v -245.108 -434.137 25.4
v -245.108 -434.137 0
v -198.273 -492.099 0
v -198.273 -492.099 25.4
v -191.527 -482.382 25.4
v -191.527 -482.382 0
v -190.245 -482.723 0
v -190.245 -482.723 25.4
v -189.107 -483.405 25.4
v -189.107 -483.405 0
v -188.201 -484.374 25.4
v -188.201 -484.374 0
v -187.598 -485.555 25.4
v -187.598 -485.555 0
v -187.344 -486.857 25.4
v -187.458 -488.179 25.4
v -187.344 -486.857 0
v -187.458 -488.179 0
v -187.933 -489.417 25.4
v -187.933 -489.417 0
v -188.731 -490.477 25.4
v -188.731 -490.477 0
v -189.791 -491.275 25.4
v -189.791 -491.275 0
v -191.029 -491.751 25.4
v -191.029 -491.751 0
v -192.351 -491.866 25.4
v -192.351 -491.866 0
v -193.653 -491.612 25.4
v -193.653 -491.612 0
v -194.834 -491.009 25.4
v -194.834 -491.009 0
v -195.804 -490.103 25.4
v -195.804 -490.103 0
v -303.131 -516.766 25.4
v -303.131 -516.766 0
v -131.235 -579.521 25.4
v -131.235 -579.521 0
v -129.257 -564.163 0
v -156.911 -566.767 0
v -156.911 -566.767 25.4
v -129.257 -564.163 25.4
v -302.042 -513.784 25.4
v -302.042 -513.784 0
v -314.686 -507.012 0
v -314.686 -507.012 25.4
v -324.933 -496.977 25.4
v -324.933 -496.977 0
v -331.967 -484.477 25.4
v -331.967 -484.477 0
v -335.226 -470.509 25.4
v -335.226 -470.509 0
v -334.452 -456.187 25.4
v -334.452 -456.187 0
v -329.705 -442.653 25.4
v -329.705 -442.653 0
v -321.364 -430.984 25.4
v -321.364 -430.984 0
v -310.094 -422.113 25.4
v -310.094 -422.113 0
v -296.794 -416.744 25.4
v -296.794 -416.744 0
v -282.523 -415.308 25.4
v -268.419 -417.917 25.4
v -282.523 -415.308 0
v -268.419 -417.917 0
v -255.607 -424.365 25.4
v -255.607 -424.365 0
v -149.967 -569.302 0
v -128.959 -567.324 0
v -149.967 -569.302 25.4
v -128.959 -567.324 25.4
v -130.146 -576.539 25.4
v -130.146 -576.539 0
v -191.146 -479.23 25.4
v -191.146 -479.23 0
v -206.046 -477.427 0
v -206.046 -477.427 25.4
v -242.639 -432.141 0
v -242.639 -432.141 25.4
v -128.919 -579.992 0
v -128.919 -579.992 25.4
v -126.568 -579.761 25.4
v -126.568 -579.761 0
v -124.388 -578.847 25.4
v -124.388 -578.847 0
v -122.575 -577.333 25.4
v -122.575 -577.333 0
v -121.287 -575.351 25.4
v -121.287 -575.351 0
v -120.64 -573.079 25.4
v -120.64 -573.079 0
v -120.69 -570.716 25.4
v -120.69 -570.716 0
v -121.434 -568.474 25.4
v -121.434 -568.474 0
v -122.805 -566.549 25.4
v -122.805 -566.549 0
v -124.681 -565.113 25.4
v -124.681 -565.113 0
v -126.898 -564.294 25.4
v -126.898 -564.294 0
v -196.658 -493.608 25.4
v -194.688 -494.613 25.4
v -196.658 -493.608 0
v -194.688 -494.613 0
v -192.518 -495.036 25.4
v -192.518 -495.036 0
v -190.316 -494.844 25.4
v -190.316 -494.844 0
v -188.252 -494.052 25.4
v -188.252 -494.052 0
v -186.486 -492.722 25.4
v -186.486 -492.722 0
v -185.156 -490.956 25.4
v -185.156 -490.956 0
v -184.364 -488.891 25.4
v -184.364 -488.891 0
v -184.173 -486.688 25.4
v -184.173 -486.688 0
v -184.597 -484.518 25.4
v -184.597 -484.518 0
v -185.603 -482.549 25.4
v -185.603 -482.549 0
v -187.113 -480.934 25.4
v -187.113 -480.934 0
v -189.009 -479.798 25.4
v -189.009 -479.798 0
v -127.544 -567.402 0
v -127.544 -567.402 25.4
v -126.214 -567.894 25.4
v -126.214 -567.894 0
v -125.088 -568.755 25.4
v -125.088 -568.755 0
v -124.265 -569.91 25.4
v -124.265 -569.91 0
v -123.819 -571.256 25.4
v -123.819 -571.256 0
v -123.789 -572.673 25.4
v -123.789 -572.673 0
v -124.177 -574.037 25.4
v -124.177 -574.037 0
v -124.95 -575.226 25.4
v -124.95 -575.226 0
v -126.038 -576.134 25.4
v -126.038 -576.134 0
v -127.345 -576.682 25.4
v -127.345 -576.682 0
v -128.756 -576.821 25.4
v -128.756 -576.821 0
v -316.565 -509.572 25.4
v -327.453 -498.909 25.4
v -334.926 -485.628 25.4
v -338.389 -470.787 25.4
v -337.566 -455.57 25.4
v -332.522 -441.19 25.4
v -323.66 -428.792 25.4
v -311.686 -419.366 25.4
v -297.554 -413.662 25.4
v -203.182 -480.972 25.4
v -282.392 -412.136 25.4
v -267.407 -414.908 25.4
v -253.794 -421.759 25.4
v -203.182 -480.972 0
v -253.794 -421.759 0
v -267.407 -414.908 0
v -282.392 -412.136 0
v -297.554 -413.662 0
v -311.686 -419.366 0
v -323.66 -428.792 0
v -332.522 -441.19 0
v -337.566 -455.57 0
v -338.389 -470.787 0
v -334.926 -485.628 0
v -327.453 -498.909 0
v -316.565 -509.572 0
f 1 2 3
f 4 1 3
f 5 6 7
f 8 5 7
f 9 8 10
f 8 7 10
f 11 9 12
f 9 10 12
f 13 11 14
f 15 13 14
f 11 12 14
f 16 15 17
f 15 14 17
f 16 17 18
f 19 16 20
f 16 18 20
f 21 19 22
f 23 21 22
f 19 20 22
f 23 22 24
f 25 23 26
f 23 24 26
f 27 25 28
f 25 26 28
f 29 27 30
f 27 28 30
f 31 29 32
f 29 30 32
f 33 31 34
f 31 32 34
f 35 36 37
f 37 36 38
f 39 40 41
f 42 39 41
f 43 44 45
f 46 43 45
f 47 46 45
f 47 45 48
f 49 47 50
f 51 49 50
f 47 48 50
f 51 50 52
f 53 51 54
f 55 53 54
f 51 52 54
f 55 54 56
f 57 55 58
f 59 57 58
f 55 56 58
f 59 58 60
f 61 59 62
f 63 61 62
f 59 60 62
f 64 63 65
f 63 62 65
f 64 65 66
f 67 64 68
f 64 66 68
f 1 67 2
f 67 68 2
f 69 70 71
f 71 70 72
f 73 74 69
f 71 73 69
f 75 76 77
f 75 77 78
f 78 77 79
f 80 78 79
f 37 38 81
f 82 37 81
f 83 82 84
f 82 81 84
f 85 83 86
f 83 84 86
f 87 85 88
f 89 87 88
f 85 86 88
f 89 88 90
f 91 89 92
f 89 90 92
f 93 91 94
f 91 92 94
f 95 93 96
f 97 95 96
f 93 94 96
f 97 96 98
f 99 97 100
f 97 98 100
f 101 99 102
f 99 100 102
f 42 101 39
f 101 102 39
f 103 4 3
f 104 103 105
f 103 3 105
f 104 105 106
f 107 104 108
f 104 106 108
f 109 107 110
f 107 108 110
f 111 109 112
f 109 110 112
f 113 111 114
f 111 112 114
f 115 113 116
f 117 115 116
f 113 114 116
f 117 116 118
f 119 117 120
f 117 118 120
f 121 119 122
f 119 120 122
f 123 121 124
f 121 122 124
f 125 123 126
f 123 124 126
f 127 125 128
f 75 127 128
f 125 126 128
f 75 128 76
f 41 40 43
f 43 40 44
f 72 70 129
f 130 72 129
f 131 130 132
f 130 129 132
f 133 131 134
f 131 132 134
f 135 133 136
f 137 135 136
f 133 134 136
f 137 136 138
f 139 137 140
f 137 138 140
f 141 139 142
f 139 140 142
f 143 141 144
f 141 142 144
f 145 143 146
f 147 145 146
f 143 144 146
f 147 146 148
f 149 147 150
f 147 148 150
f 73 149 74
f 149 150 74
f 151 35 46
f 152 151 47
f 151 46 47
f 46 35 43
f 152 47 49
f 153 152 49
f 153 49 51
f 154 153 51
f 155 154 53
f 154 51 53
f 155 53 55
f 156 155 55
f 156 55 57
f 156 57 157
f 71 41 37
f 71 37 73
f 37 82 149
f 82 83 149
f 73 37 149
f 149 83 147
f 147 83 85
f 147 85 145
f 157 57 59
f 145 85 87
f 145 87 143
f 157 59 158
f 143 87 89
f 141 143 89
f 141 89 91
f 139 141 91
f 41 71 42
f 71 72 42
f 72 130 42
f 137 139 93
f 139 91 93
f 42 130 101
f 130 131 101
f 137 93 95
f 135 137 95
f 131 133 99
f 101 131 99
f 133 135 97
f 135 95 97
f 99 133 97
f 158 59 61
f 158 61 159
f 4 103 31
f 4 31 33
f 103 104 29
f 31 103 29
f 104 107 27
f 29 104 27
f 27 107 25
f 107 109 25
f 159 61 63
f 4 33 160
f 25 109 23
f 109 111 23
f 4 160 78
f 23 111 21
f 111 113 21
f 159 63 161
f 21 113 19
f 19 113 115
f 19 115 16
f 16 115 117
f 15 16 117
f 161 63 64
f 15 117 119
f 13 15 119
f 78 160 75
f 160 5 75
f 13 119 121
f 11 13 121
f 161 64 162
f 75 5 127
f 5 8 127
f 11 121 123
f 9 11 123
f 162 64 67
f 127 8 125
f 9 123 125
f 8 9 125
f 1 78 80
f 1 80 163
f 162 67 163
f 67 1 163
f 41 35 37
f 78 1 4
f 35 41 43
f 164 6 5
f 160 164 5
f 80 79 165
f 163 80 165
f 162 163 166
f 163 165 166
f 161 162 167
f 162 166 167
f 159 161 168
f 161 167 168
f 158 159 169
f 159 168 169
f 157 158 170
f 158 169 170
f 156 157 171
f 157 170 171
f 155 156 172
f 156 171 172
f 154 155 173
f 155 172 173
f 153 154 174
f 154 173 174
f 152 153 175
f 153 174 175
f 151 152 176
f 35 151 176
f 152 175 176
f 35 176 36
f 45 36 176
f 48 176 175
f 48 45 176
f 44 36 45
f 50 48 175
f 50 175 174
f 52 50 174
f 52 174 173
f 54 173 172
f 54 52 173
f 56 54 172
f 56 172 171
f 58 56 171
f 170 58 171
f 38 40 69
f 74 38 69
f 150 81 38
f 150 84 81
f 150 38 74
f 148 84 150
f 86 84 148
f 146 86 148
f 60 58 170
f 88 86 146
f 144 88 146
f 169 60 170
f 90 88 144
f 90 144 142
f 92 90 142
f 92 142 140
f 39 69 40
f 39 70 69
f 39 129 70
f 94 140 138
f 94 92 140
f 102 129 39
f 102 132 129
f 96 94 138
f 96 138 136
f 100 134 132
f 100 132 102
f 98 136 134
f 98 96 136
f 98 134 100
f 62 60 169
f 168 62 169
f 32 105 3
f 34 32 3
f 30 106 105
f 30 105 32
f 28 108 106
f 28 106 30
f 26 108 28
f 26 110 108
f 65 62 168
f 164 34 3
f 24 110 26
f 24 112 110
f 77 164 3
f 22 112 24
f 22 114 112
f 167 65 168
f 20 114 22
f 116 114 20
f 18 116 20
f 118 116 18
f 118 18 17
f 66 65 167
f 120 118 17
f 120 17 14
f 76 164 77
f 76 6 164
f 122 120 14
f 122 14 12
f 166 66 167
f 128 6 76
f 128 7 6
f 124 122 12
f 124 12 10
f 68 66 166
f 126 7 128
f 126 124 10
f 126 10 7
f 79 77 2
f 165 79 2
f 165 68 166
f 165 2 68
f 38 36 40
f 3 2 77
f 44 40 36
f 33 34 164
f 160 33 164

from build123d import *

# Parameters (mm, degrees)
EXTRUDE_THIN1_DEPTH = 25.4
BOSS_EXTRUDE1_REACH = 633.439
SKETCH3_W           = 25.4
SKETCH3_H           = 3.175
BOSS_EXTRUDE2_REACH = 587.221
SKETCH4_W           = 25.4
SKETCH4_H           = 3.175


with BuildPart() as part:
    # Sketch2 → Extrude-Thin1 (new body)
    with BuildSketch(Plane.XY):
        with BuildLine():
            ThreePointArc((-128.959094117, -567.323540773), (-123.788950473, -572.673268248), (-130.145681643, -576.538748578))
            Line((-130.145681643, -576.538748578), (-302.042094367, -513.783924281))
            ThreePointArc((-302.042094367, -513.783924281), (-325.948053636, -436.522751042), (-245.108142892, -434.136832006))
            Line((-245.108142892, -434.136832006), (-198.273248153, -492.098506685))
            ThreePointArc((-198.273248153, -492.098506685), (-185.155706812, -490.955524281), (-191.14596289, -479.229777749))
            Line((-191.14596289, -479.229777749), (-191.527323999, -482.381791186))
            ThreePointArc((-191.527323999, -482.381791186), (-187.933170352, -489.417239105), (-195.803695157, -490.103028547))
            Line((-195.803695157, -490.103028547), (-242.638589895, -432.141353869))
            ThreePointArc((-242.638589895, -432.141353869), (-328.530995061, -434.676392845), (-303.130913338, -516.76638941))
            Line((-303.130913338, -516.76638941), (-131.234500614, -579.521213708))
            ThreePointArc((-131.234500614, -579.521213708), (-120.639948663, -573.078746491), (-129.256854737, -564.162534033))
            Line((-129.256854737, -564.162534033), (-128.959094117, -567.323540773))
        make_face()
    extrude(amount=EXTRUDE_THIN1_DEPTH)

    # Boss-Extrude1: up to this plane
    boss_extrude1_end = Plane(origin=(-242.638589895, -432.141353869, 25.4), z_dir=(-0.7778119673882409, -0.6284970512163396, 0))
    # Sketch3 → Boss-Extrude1 (add, up to the surface)
    with BuildSketch(Plane(origin=(-131.24290391, 15.879037441, 0), x_dir=(0, 0, 1), z_dir=(-0.9927601375164752, 0.12011373509415744, 0)), mode=Mode.PRIVATE) as boss_extrude1_sk1:
        with Locations((12.7, -500.306975611)):
            Rectangle(SKETCH3_W, SKETCH3_H)
    boss_extrude1_tool1 = split(extrude(boss_extrude1_sk1.sketch, amount=BOSS_EXTRUDE1_REACH, mode=Mode.PRIVATE), bisect_by=boss_extrude1_end, keep=Keep.BOTH, mode=Mode.PRIVATE)
    add(boss_extrude1_tool1.solids().sort_by_distance((-191.336643, -480.805784, 12.7))[0])

    # Boss-Extrude2: up to this plane
    boss_extrude2_end = Plane(origin=(-302.042094367, -513.783924281, 25.4), z_dir=(0.3429351088975487, 0.9393590959188219, 0))
    # Sketch4 → Boss-Extrude2 (add, up to the surface)
    with BuildSketch(Plane(origin=(-180.795608077, -17.030590821, 0), x_dir=(0, 0, 1), z_dir=(-0.9955926741540518, -0.09378287248098222, 0)), mode=Mode.PRIVATE) as boss_extrude2_sk1:
        with Locations((12.7, -551.14150679)):
            Rectangle(SKETCH4_W, SKETCH4_H)
    boss_extrude2_tool1 = split(extrude(boss_extrude2_sk1.sketch, amount=BOSS_EXTRUDE2_REACH, mode=Mode.PRIVATE), bisect_by=boss_extrude2_end, keep=Keep.BOTH, mode=Mode.PRIVATE)
    add(boss_extrude2_tool1.solids().sort_by_distance((-129.107974, -565.743037, 12.7))[0])


solid = part.part
